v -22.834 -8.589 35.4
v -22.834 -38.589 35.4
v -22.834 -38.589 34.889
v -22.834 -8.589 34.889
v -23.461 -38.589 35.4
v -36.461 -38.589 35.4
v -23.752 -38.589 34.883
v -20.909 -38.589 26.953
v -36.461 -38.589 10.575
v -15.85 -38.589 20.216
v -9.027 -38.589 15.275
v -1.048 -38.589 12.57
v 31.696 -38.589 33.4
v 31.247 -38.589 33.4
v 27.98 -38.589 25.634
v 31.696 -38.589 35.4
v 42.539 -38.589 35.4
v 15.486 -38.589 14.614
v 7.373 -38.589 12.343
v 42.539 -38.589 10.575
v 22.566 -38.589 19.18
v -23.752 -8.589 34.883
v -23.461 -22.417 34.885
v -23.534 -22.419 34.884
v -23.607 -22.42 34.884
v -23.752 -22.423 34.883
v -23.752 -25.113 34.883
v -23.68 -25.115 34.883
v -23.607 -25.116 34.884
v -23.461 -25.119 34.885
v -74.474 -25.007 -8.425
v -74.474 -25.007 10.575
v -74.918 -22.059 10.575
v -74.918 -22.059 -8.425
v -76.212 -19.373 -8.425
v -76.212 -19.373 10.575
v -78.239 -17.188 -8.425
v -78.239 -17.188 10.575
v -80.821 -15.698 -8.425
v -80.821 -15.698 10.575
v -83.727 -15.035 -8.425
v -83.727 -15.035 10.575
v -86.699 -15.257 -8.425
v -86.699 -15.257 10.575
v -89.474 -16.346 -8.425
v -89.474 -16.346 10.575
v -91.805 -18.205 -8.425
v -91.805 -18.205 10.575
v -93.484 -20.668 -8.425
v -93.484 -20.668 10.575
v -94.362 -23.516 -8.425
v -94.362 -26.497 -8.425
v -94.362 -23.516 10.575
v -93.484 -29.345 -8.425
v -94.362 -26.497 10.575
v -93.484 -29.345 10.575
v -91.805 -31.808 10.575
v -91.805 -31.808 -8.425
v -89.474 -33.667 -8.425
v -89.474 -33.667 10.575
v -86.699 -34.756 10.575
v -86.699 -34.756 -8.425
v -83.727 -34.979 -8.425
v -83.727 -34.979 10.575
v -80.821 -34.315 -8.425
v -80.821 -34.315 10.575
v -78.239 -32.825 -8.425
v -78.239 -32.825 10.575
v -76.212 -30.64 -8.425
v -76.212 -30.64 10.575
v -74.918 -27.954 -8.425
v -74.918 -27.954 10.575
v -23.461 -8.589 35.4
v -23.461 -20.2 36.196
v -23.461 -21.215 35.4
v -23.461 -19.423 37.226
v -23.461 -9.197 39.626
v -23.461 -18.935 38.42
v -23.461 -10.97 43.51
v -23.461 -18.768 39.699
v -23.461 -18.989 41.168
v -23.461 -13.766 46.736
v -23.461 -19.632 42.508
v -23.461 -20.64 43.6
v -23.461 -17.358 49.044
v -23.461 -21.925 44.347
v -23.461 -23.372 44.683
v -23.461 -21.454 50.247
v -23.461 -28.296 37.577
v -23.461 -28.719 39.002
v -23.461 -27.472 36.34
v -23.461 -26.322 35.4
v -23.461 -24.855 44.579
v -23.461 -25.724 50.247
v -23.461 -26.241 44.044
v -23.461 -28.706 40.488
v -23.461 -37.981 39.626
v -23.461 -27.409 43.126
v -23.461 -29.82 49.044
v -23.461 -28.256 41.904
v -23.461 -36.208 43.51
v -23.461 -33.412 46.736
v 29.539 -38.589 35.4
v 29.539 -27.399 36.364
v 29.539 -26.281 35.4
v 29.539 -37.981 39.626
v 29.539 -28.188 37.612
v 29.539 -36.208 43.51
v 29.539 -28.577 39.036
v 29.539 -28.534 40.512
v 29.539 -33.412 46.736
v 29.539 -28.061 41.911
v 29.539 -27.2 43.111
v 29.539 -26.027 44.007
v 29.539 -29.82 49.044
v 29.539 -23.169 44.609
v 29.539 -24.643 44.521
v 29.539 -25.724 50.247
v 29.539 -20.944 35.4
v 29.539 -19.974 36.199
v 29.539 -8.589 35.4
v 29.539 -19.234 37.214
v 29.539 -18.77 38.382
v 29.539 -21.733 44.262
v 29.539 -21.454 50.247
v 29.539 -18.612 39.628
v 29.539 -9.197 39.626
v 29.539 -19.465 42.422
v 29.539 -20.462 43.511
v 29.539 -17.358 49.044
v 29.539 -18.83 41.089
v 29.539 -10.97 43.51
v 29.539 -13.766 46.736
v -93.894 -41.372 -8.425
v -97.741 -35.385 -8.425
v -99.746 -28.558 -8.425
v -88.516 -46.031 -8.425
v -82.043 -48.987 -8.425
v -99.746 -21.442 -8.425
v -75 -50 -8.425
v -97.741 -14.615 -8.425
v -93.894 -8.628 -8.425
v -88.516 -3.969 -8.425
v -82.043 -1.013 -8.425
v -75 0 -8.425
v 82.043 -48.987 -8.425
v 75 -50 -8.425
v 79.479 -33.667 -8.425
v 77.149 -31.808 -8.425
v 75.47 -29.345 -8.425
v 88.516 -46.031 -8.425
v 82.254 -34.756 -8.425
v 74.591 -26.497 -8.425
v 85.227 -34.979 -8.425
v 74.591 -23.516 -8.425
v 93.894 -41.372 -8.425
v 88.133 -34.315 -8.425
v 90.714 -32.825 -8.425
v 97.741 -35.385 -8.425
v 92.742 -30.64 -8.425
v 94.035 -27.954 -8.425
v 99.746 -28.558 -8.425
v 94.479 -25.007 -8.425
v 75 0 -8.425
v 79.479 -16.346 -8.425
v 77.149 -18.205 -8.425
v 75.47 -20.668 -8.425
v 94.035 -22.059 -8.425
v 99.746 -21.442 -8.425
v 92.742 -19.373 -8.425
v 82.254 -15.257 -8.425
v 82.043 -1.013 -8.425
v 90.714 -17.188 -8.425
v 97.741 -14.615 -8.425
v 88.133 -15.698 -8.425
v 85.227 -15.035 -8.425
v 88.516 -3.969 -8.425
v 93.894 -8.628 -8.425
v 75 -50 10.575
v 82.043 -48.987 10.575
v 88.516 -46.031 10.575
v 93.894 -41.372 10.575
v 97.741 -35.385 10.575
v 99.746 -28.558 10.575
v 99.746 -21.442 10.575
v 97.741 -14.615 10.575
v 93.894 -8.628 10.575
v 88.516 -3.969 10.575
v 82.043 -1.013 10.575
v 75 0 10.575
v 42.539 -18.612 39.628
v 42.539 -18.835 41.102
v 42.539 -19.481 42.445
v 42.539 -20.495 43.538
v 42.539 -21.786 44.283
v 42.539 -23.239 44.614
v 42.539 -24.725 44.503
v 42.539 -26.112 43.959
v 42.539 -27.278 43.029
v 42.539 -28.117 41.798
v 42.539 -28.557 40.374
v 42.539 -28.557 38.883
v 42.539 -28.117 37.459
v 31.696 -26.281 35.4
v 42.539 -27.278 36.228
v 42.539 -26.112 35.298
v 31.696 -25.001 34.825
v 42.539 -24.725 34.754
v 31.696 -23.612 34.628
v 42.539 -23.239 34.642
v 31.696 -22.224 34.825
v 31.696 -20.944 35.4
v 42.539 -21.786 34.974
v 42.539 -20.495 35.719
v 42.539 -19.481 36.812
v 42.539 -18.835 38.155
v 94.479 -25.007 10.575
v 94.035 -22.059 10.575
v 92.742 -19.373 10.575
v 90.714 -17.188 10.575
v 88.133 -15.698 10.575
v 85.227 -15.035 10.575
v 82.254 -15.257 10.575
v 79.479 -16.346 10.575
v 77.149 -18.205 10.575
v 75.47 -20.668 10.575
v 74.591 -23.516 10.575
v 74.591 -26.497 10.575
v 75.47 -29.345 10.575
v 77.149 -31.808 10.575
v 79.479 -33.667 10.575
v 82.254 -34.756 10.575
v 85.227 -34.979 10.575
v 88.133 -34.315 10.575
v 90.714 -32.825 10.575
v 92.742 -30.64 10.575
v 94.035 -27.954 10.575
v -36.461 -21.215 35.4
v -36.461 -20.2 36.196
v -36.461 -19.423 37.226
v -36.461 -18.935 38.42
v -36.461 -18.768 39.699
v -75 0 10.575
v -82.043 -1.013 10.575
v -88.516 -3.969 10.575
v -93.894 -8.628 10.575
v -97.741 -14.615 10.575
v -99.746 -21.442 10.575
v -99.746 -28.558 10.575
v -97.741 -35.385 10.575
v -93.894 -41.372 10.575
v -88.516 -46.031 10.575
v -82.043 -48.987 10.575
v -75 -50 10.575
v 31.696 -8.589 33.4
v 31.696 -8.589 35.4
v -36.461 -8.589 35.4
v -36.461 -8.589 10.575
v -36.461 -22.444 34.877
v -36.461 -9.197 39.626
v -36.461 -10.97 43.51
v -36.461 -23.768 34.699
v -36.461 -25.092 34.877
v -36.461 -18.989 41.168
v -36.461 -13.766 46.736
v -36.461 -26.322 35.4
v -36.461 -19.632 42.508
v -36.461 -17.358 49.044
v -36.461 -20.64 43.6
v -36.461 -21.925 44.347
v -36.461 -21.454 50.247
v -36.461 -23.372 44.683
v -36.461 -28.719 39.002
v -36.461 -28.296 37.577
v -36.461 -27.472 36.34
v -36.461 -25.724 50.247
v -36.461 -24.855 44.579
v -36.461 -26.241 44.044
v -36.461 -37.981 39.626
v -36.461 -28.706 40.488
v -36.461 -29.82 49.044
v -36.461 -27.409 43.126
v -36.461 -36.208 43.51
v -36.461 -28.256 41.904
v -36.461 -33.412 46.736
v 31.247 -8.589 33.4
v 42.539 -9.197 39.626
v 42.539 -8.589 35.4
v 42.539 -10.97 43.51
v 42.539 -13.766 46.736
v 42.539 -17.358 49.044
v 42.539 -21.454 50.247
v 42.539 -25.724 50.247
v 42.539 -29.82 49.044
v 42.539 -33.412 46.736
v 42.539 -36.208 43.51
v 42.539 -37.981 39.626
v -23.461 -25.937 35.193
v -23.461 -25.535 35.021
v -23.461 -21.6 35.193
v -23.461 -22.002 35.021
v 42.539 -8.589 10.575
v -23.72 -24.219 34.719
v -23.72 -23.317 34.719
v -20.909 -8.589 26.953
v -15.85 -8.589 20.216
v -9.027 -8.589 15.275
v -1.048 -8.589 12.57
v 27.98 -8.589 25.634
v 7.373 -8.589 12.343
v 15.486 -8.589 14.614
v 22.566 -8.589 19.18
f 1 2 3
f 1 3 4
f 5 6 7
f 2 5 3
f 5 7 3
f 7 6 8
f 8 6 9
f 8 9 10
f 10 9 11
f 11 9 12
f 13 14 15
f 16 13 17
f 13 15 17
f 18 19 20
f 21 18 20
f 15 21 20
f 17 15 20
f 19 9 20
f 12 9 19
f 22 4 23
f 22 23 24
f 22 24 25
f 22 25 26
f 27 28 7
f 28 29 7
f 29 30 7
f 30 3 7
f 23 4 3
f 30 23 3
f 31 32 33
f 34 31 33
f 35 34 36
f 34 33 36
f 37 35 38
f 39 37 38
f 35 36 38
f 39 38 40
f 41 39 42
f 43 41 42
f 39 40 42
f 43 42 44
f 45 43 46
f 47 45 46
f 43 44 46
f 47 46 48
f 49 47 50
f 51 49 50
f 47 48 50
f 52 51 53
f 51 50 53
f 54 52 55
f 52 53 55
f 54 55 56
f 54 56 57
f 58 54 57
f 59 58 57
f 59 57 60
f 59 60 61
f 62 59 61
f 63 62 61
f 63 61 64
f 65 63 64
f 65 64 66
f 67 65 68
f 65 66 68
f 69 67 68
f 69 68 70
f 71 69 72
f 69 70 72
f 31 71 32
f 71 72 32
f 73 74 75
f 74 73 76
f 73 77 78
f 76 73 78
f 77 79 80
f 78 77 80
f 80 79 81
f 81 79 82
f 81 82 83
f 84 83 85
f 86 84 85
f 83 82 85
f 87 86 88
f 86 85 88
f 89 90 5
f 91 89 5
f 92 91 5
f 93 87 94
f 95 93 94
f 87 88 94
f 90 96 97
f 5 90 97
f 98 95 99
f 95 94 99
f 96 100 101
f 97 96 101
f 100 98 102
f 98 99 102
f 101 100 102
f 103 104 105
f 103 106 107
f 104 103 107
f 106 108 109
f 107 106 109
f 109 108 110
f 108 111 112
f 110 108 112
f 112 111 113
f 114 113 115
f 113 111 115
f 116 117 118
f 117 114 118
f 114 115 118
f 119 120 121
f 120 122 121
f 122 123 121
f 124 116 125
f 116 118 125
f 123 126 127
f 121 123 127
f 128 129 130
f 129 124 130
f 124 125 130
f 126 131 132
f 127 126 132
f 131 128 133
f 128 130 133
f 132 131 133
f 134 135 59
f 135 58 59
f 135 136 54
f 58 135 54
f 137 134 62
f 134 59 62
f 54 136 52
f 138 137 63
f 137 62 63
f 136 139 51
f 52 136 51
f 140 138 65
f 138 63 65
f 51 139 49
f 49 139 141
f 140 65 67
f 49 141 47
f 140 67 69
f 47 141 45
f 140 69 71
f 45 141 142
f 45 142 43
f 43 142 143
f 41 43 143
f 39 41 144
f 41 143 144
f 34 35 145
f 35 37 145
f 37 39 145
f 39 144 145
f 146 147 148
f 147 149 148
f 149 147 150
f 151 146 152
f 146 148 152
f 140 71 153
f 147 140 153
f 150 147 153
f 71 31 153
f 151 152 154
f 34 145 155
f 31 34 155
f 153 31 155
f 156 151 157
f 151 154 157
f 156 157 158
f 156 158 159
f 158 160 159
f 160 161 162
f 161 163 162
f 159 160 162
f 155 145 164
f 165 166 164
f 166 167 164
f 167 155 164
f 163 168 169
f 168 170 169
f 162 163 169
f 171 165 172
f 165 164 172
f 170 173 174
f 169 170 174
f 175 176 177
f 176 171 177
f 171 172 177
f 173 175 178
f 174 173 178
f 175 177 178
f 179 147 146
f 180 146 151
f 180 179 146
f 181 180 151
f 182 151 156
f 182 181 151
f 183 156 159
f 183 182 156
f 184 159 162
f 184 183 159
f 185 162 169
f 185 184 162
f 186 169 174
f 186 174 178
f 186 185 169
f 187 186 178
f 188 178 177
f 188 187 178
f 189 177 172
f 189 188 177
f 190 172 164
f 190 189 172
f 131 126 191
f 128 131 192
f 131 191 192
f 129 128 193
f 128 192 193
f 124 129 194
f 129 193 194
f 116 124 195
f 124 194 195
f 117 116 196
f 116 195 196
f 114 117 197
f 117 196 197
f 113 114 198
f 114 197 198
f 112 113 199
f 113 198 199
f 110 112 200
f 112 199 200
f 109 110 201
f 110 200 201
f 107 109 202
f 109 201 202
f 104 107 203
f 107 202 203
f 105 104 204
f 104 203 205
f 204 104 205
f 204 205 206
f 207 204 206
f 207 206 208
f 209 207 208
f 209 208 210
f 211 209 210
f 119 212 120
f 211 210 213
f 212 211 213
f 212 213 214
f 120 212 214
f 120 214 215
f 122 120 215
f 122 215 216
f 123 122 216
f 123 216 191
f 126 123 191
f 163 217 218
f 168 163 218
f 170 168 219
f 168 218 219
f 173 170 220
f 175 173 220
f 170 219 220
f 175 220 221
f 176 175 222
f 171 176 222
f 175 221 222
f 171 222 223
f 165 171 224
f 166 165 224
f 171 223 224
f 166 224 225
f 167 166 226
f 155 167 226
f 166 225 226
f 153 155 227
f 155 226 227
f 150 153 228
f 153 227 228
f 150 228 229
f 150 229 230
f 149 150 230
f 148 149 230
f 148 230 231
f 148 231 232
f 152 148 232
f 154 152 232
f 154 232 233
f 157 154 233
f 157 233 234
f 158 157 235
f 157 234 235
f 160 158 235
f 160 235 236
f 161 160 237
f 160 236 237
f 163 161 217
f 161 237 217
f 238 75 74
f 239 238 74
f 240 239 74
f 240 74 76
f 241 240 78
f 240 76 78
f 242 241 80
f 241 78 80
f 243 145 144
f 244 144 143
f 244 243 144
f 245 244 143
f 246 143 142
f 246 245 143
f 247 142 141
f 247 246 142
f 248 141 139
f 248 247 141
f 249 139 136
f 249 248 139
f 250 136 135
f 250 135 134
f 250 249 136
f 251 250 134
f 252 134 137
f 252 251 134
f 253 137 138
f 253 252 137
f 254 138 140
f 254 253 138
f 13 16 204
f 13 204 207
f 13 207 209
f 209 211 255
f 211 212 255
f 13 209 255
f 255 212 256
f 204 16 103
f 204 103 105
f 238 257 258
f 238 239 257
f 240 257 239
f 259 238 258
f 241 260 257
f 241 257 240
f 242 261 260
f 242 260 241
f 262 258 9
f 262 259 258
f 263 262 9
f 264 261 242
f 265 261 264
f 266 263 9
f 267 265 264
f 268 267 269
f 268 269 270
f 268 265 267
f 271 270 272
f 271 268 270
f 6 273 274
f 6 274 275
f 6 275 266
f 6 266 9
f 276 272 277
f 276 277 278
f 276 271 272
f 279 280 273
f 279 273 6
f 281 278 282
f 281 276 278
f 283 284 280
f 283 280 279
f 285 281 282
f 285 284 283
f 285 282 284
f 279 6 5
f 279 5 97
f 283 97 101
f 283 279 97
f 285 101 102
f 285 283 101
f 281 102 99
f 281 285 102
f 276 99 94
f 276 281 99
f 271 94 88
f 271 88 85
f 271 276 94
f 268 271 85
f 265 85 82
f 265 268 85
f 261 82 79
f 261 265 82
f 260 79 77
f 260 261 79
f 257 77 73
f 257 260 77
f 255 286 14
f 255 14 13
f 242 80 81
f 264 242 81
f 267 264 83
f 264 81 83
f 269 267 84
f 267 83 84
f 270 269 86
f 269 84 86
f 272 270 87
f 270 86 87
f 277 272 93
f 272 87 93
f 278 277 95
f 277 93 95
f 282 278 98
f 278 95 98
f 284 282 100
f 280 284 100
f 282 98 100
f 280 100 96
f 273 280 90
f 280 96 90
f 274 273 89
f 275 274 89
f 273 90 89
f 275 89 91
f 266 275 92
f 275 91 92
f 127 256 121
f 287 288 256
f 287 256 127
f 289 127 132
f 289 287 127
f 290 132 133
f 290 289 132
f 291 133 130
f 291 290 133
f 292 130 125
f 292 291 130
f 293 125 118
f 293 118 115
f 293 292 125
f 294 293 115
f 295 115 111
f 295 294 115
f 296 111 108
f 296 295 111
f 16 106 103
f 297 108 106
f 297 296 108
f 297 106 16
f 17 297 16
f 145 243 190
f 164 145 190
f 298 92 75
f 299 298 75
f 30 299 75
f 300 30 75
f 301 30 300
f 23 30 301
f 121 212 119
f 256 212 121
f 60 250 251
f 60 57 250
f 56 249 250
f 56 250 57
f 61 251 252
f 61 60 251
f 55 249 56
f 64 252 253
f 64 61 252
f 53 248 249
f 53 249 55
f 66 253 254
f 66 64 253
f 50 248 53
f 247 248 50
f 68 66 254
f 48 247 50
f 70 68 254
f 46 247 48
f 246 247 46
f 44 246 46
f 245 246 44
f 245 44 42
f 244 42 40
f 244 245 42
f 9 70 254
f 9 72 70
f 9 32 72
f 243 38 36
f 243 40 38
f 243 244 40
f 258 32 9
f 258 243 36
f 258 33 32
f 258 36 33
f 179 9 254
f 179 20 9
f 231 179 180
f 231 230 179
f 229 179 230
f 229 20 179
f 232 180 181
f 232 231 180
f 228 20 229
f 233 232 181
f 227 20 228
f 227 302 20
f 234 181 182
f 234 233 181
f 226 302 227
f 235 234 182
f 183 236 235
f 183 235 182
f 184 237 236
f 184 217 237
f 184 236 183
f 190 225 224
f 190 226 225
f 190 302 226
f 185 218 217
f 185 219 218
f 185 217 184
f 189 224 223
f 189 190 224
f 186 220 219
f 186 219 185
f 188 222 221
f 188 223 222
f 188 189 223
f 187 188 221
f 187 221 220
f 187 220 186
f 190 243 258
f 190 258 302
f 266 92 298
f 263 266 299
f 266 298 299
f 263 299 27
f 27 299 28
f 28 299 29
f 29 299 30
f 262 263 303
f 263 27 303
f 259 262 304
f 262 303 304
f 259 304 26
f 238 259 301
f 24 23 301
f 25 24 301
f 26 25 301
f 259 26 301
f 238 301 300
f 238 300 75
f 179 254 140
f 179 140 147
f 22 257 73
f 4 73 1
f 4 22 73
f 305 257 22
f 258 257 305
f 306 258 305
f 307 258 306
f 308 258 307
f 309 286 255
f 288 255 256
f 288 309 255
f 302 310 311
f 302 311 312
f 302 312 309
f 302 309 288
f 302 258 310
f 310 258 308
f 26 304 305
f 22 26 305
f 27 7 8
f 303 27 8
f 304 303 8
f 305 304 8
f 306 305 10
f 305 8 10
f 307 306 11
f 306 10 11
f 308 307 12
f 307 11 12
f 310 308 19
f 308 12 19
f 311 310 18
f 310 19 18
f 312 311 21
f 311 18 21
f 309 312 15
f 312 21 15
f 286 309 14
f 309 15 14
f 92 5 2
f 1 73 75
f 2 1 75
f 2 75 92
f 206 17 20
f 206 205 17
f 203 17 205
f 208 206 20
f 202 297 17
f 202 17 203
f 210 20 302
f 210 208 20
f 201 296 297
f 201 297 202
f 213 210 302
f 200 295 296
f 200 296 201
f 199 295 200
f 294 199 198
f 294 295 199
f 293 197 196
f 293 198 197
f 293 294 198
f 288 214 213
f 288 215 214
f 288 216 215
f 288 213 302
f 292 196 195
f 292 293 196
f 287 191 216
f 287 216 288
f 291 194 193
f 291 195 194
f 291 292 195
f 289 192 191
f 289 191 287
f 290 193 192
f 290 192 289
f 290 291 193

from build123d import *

# Parameters (mm, degrees)
F0_W      = 150
F0_H      = 19
F1_DEPTH  = 50
F3_DEPTH  = 19
F4_W      = 79
F4_H      = 30
F5_DEPTH  = 35.4
F8_DEPTH  = 30
F9_W      = 54.530326277
F9_H      = 30
F10_DEPTH = 2
F12_DEPTH = 13
F14_DEPTH = 13
F15_R     = 5
F16_DEPTH = 13
F18_DEPTH = 13
F19_R     = 10
F20_DEPTH = 19
F21_DEPTH = 19


with BuildPart() as f1:
    # F0 (on Front) → F1 (new body)
    with BuildSketch(Plane.XZ):
        with Locations((0, 1.0748035961)):
            Rectangle(F0_W, F0_H)
    extrude(amount=F1_DEPTH)

    # F2 (on face) → F3 (join)
    with BuildSketch(Plane.XY.offset(10.5748035961)):
        with BuildLine():
            Line((-75, -50), (-75, 0))
            ThreePointArc((-75, 0), (-100, -25), (-75, -50))
        make_face()
        with BuildLine():
            ThreePointArc((75, -50), (100, -25), (75, 0))
            Line((75, 0), (75, -50))
        make_face()
    extrude(amount=-F3_DEPTH)

    # F4 (on Top) → F5 (join)
    with BuildSketch(Plane.XY):
        with Locations((3.0394736677, -23.589033746)):
            Rectangle(F4_W, F4_H)
    extrude(amount=F5_DEPTH)

    # F7 (on face) → F8 (cut)
    with BuildSketch(Plane.XZ.offset(38.589033746)):
        with BuildLine():
            Line((31.6433943808, 35.2142751217), (-23.7523913383, 34.8830260336))
            ThreePointArc((-23.7523913383, 34.8830260336), (4.0825457385, 12.1303321123), (31.6433943808, 35.2142751217))
        make_face()
    extrude(amount=-F8_DEPTH, mode=Mode.SUBTRACT)

    # F9 (on face) → F10 (cut)
    with BuildSketch(Plane.XY.offset(35.4)):
        with Locations((4.4306721538, -23.589033746)):
            Rectangle(F9_W, F9_H)
    extrude(amount=-F10_DEPTH, mode=Mode.SUBTRACT)

    # F11 (on face) → F12 (join)
    with BuildSketch(Plane(origin=(-36.4605263323, 0, 0), x_dir=(0, -1, 0), z_dir=(-1, 0, 0))):
        with BuildLine():
            Line((8.589033746, 35.4), (38.589033746, 35.4))
            ThreePointArc((38.589033746, 35.4), (23.589033746, 50.4), (8.589033746, 35.4))
        make_face()
    extrude(amount=-F12_DEPTH)

    # F13 (on face) → F14 (join)
    with BuildSketch(Plane.YZ.offset(42.5394736677)):
        with BuildLine():
            Line((-38.589033746, 35.4), (-8.589033746, 35.4))
            ThreePointArc((-8.589033746, 35.4), (-23.589033746, 50.4), (-38.589033746, 35.4))
        make_face()
    extrude(amount=-F14_DEPTH)

    # F15 (on face) → F16 (cut)
    with BuildSketch(Plane.YZ.offset(42.5394736677)):
        with Locations((-23.6123930663, 39.6284162998)):
            Circle(F15_R)
    extrude(amount=-F16_DEPTH, mode=Mode.SUBTRACT)

    # F17 (on face) → F18 (cut)
    with BuildSketch(Plane.YZ.offset(-23.4605263323)):
        with BuildLine():
            Line((-21.2145990318, 35.4), (-26.3218262607, 35.4))
            ThreePointArc((-26.3218262607, 35.4), (-23.7682126462, 34.6987274289), (-21.2145990318, 35.4))
        make_face()
        with BuildLine():
            ThreePointArc((-21.2145990318, 35.4), (-19.4226362707, 37.2256795192), (-18.7682126462, 39.6987274289))
            ThreePointArc((-18.7682126462, 39.6987274289), (-26.241260556, 44.0443038045), (-26.3218262607, 35.4))
            Line((-26.3218262607, 35.4), (-21.2145990318, 35.4))
        make_face()
    extrude(amount=-F18_DEPTH, mode=Mode.SUBTRACT)

    # F19 (on face) → F20 (cut)
    with BuildSketch(Plane.XY.offset(10.5748035961)):
        with Locations((-84.4740969445, -25.0065810978)):
            Circle(F19_R)
    extrude(amount=-F20_DEPTH, mode=Mode.SUBTRACT)

    # F19 (on face) → F21 (cut)
    with BuildSketch(Plane.XY.offset(10.5748035961)):
        with Locations((-84.4740969445, -25.0065810978)):
            Circle(F19_R)
        with Locations((84.4793568792, -25.0065810978)):
            Circle(F19_R)
    extrude(amount=-F21_DEPTH, mode=Mode.SUBTRACT)


solid = f1.part
